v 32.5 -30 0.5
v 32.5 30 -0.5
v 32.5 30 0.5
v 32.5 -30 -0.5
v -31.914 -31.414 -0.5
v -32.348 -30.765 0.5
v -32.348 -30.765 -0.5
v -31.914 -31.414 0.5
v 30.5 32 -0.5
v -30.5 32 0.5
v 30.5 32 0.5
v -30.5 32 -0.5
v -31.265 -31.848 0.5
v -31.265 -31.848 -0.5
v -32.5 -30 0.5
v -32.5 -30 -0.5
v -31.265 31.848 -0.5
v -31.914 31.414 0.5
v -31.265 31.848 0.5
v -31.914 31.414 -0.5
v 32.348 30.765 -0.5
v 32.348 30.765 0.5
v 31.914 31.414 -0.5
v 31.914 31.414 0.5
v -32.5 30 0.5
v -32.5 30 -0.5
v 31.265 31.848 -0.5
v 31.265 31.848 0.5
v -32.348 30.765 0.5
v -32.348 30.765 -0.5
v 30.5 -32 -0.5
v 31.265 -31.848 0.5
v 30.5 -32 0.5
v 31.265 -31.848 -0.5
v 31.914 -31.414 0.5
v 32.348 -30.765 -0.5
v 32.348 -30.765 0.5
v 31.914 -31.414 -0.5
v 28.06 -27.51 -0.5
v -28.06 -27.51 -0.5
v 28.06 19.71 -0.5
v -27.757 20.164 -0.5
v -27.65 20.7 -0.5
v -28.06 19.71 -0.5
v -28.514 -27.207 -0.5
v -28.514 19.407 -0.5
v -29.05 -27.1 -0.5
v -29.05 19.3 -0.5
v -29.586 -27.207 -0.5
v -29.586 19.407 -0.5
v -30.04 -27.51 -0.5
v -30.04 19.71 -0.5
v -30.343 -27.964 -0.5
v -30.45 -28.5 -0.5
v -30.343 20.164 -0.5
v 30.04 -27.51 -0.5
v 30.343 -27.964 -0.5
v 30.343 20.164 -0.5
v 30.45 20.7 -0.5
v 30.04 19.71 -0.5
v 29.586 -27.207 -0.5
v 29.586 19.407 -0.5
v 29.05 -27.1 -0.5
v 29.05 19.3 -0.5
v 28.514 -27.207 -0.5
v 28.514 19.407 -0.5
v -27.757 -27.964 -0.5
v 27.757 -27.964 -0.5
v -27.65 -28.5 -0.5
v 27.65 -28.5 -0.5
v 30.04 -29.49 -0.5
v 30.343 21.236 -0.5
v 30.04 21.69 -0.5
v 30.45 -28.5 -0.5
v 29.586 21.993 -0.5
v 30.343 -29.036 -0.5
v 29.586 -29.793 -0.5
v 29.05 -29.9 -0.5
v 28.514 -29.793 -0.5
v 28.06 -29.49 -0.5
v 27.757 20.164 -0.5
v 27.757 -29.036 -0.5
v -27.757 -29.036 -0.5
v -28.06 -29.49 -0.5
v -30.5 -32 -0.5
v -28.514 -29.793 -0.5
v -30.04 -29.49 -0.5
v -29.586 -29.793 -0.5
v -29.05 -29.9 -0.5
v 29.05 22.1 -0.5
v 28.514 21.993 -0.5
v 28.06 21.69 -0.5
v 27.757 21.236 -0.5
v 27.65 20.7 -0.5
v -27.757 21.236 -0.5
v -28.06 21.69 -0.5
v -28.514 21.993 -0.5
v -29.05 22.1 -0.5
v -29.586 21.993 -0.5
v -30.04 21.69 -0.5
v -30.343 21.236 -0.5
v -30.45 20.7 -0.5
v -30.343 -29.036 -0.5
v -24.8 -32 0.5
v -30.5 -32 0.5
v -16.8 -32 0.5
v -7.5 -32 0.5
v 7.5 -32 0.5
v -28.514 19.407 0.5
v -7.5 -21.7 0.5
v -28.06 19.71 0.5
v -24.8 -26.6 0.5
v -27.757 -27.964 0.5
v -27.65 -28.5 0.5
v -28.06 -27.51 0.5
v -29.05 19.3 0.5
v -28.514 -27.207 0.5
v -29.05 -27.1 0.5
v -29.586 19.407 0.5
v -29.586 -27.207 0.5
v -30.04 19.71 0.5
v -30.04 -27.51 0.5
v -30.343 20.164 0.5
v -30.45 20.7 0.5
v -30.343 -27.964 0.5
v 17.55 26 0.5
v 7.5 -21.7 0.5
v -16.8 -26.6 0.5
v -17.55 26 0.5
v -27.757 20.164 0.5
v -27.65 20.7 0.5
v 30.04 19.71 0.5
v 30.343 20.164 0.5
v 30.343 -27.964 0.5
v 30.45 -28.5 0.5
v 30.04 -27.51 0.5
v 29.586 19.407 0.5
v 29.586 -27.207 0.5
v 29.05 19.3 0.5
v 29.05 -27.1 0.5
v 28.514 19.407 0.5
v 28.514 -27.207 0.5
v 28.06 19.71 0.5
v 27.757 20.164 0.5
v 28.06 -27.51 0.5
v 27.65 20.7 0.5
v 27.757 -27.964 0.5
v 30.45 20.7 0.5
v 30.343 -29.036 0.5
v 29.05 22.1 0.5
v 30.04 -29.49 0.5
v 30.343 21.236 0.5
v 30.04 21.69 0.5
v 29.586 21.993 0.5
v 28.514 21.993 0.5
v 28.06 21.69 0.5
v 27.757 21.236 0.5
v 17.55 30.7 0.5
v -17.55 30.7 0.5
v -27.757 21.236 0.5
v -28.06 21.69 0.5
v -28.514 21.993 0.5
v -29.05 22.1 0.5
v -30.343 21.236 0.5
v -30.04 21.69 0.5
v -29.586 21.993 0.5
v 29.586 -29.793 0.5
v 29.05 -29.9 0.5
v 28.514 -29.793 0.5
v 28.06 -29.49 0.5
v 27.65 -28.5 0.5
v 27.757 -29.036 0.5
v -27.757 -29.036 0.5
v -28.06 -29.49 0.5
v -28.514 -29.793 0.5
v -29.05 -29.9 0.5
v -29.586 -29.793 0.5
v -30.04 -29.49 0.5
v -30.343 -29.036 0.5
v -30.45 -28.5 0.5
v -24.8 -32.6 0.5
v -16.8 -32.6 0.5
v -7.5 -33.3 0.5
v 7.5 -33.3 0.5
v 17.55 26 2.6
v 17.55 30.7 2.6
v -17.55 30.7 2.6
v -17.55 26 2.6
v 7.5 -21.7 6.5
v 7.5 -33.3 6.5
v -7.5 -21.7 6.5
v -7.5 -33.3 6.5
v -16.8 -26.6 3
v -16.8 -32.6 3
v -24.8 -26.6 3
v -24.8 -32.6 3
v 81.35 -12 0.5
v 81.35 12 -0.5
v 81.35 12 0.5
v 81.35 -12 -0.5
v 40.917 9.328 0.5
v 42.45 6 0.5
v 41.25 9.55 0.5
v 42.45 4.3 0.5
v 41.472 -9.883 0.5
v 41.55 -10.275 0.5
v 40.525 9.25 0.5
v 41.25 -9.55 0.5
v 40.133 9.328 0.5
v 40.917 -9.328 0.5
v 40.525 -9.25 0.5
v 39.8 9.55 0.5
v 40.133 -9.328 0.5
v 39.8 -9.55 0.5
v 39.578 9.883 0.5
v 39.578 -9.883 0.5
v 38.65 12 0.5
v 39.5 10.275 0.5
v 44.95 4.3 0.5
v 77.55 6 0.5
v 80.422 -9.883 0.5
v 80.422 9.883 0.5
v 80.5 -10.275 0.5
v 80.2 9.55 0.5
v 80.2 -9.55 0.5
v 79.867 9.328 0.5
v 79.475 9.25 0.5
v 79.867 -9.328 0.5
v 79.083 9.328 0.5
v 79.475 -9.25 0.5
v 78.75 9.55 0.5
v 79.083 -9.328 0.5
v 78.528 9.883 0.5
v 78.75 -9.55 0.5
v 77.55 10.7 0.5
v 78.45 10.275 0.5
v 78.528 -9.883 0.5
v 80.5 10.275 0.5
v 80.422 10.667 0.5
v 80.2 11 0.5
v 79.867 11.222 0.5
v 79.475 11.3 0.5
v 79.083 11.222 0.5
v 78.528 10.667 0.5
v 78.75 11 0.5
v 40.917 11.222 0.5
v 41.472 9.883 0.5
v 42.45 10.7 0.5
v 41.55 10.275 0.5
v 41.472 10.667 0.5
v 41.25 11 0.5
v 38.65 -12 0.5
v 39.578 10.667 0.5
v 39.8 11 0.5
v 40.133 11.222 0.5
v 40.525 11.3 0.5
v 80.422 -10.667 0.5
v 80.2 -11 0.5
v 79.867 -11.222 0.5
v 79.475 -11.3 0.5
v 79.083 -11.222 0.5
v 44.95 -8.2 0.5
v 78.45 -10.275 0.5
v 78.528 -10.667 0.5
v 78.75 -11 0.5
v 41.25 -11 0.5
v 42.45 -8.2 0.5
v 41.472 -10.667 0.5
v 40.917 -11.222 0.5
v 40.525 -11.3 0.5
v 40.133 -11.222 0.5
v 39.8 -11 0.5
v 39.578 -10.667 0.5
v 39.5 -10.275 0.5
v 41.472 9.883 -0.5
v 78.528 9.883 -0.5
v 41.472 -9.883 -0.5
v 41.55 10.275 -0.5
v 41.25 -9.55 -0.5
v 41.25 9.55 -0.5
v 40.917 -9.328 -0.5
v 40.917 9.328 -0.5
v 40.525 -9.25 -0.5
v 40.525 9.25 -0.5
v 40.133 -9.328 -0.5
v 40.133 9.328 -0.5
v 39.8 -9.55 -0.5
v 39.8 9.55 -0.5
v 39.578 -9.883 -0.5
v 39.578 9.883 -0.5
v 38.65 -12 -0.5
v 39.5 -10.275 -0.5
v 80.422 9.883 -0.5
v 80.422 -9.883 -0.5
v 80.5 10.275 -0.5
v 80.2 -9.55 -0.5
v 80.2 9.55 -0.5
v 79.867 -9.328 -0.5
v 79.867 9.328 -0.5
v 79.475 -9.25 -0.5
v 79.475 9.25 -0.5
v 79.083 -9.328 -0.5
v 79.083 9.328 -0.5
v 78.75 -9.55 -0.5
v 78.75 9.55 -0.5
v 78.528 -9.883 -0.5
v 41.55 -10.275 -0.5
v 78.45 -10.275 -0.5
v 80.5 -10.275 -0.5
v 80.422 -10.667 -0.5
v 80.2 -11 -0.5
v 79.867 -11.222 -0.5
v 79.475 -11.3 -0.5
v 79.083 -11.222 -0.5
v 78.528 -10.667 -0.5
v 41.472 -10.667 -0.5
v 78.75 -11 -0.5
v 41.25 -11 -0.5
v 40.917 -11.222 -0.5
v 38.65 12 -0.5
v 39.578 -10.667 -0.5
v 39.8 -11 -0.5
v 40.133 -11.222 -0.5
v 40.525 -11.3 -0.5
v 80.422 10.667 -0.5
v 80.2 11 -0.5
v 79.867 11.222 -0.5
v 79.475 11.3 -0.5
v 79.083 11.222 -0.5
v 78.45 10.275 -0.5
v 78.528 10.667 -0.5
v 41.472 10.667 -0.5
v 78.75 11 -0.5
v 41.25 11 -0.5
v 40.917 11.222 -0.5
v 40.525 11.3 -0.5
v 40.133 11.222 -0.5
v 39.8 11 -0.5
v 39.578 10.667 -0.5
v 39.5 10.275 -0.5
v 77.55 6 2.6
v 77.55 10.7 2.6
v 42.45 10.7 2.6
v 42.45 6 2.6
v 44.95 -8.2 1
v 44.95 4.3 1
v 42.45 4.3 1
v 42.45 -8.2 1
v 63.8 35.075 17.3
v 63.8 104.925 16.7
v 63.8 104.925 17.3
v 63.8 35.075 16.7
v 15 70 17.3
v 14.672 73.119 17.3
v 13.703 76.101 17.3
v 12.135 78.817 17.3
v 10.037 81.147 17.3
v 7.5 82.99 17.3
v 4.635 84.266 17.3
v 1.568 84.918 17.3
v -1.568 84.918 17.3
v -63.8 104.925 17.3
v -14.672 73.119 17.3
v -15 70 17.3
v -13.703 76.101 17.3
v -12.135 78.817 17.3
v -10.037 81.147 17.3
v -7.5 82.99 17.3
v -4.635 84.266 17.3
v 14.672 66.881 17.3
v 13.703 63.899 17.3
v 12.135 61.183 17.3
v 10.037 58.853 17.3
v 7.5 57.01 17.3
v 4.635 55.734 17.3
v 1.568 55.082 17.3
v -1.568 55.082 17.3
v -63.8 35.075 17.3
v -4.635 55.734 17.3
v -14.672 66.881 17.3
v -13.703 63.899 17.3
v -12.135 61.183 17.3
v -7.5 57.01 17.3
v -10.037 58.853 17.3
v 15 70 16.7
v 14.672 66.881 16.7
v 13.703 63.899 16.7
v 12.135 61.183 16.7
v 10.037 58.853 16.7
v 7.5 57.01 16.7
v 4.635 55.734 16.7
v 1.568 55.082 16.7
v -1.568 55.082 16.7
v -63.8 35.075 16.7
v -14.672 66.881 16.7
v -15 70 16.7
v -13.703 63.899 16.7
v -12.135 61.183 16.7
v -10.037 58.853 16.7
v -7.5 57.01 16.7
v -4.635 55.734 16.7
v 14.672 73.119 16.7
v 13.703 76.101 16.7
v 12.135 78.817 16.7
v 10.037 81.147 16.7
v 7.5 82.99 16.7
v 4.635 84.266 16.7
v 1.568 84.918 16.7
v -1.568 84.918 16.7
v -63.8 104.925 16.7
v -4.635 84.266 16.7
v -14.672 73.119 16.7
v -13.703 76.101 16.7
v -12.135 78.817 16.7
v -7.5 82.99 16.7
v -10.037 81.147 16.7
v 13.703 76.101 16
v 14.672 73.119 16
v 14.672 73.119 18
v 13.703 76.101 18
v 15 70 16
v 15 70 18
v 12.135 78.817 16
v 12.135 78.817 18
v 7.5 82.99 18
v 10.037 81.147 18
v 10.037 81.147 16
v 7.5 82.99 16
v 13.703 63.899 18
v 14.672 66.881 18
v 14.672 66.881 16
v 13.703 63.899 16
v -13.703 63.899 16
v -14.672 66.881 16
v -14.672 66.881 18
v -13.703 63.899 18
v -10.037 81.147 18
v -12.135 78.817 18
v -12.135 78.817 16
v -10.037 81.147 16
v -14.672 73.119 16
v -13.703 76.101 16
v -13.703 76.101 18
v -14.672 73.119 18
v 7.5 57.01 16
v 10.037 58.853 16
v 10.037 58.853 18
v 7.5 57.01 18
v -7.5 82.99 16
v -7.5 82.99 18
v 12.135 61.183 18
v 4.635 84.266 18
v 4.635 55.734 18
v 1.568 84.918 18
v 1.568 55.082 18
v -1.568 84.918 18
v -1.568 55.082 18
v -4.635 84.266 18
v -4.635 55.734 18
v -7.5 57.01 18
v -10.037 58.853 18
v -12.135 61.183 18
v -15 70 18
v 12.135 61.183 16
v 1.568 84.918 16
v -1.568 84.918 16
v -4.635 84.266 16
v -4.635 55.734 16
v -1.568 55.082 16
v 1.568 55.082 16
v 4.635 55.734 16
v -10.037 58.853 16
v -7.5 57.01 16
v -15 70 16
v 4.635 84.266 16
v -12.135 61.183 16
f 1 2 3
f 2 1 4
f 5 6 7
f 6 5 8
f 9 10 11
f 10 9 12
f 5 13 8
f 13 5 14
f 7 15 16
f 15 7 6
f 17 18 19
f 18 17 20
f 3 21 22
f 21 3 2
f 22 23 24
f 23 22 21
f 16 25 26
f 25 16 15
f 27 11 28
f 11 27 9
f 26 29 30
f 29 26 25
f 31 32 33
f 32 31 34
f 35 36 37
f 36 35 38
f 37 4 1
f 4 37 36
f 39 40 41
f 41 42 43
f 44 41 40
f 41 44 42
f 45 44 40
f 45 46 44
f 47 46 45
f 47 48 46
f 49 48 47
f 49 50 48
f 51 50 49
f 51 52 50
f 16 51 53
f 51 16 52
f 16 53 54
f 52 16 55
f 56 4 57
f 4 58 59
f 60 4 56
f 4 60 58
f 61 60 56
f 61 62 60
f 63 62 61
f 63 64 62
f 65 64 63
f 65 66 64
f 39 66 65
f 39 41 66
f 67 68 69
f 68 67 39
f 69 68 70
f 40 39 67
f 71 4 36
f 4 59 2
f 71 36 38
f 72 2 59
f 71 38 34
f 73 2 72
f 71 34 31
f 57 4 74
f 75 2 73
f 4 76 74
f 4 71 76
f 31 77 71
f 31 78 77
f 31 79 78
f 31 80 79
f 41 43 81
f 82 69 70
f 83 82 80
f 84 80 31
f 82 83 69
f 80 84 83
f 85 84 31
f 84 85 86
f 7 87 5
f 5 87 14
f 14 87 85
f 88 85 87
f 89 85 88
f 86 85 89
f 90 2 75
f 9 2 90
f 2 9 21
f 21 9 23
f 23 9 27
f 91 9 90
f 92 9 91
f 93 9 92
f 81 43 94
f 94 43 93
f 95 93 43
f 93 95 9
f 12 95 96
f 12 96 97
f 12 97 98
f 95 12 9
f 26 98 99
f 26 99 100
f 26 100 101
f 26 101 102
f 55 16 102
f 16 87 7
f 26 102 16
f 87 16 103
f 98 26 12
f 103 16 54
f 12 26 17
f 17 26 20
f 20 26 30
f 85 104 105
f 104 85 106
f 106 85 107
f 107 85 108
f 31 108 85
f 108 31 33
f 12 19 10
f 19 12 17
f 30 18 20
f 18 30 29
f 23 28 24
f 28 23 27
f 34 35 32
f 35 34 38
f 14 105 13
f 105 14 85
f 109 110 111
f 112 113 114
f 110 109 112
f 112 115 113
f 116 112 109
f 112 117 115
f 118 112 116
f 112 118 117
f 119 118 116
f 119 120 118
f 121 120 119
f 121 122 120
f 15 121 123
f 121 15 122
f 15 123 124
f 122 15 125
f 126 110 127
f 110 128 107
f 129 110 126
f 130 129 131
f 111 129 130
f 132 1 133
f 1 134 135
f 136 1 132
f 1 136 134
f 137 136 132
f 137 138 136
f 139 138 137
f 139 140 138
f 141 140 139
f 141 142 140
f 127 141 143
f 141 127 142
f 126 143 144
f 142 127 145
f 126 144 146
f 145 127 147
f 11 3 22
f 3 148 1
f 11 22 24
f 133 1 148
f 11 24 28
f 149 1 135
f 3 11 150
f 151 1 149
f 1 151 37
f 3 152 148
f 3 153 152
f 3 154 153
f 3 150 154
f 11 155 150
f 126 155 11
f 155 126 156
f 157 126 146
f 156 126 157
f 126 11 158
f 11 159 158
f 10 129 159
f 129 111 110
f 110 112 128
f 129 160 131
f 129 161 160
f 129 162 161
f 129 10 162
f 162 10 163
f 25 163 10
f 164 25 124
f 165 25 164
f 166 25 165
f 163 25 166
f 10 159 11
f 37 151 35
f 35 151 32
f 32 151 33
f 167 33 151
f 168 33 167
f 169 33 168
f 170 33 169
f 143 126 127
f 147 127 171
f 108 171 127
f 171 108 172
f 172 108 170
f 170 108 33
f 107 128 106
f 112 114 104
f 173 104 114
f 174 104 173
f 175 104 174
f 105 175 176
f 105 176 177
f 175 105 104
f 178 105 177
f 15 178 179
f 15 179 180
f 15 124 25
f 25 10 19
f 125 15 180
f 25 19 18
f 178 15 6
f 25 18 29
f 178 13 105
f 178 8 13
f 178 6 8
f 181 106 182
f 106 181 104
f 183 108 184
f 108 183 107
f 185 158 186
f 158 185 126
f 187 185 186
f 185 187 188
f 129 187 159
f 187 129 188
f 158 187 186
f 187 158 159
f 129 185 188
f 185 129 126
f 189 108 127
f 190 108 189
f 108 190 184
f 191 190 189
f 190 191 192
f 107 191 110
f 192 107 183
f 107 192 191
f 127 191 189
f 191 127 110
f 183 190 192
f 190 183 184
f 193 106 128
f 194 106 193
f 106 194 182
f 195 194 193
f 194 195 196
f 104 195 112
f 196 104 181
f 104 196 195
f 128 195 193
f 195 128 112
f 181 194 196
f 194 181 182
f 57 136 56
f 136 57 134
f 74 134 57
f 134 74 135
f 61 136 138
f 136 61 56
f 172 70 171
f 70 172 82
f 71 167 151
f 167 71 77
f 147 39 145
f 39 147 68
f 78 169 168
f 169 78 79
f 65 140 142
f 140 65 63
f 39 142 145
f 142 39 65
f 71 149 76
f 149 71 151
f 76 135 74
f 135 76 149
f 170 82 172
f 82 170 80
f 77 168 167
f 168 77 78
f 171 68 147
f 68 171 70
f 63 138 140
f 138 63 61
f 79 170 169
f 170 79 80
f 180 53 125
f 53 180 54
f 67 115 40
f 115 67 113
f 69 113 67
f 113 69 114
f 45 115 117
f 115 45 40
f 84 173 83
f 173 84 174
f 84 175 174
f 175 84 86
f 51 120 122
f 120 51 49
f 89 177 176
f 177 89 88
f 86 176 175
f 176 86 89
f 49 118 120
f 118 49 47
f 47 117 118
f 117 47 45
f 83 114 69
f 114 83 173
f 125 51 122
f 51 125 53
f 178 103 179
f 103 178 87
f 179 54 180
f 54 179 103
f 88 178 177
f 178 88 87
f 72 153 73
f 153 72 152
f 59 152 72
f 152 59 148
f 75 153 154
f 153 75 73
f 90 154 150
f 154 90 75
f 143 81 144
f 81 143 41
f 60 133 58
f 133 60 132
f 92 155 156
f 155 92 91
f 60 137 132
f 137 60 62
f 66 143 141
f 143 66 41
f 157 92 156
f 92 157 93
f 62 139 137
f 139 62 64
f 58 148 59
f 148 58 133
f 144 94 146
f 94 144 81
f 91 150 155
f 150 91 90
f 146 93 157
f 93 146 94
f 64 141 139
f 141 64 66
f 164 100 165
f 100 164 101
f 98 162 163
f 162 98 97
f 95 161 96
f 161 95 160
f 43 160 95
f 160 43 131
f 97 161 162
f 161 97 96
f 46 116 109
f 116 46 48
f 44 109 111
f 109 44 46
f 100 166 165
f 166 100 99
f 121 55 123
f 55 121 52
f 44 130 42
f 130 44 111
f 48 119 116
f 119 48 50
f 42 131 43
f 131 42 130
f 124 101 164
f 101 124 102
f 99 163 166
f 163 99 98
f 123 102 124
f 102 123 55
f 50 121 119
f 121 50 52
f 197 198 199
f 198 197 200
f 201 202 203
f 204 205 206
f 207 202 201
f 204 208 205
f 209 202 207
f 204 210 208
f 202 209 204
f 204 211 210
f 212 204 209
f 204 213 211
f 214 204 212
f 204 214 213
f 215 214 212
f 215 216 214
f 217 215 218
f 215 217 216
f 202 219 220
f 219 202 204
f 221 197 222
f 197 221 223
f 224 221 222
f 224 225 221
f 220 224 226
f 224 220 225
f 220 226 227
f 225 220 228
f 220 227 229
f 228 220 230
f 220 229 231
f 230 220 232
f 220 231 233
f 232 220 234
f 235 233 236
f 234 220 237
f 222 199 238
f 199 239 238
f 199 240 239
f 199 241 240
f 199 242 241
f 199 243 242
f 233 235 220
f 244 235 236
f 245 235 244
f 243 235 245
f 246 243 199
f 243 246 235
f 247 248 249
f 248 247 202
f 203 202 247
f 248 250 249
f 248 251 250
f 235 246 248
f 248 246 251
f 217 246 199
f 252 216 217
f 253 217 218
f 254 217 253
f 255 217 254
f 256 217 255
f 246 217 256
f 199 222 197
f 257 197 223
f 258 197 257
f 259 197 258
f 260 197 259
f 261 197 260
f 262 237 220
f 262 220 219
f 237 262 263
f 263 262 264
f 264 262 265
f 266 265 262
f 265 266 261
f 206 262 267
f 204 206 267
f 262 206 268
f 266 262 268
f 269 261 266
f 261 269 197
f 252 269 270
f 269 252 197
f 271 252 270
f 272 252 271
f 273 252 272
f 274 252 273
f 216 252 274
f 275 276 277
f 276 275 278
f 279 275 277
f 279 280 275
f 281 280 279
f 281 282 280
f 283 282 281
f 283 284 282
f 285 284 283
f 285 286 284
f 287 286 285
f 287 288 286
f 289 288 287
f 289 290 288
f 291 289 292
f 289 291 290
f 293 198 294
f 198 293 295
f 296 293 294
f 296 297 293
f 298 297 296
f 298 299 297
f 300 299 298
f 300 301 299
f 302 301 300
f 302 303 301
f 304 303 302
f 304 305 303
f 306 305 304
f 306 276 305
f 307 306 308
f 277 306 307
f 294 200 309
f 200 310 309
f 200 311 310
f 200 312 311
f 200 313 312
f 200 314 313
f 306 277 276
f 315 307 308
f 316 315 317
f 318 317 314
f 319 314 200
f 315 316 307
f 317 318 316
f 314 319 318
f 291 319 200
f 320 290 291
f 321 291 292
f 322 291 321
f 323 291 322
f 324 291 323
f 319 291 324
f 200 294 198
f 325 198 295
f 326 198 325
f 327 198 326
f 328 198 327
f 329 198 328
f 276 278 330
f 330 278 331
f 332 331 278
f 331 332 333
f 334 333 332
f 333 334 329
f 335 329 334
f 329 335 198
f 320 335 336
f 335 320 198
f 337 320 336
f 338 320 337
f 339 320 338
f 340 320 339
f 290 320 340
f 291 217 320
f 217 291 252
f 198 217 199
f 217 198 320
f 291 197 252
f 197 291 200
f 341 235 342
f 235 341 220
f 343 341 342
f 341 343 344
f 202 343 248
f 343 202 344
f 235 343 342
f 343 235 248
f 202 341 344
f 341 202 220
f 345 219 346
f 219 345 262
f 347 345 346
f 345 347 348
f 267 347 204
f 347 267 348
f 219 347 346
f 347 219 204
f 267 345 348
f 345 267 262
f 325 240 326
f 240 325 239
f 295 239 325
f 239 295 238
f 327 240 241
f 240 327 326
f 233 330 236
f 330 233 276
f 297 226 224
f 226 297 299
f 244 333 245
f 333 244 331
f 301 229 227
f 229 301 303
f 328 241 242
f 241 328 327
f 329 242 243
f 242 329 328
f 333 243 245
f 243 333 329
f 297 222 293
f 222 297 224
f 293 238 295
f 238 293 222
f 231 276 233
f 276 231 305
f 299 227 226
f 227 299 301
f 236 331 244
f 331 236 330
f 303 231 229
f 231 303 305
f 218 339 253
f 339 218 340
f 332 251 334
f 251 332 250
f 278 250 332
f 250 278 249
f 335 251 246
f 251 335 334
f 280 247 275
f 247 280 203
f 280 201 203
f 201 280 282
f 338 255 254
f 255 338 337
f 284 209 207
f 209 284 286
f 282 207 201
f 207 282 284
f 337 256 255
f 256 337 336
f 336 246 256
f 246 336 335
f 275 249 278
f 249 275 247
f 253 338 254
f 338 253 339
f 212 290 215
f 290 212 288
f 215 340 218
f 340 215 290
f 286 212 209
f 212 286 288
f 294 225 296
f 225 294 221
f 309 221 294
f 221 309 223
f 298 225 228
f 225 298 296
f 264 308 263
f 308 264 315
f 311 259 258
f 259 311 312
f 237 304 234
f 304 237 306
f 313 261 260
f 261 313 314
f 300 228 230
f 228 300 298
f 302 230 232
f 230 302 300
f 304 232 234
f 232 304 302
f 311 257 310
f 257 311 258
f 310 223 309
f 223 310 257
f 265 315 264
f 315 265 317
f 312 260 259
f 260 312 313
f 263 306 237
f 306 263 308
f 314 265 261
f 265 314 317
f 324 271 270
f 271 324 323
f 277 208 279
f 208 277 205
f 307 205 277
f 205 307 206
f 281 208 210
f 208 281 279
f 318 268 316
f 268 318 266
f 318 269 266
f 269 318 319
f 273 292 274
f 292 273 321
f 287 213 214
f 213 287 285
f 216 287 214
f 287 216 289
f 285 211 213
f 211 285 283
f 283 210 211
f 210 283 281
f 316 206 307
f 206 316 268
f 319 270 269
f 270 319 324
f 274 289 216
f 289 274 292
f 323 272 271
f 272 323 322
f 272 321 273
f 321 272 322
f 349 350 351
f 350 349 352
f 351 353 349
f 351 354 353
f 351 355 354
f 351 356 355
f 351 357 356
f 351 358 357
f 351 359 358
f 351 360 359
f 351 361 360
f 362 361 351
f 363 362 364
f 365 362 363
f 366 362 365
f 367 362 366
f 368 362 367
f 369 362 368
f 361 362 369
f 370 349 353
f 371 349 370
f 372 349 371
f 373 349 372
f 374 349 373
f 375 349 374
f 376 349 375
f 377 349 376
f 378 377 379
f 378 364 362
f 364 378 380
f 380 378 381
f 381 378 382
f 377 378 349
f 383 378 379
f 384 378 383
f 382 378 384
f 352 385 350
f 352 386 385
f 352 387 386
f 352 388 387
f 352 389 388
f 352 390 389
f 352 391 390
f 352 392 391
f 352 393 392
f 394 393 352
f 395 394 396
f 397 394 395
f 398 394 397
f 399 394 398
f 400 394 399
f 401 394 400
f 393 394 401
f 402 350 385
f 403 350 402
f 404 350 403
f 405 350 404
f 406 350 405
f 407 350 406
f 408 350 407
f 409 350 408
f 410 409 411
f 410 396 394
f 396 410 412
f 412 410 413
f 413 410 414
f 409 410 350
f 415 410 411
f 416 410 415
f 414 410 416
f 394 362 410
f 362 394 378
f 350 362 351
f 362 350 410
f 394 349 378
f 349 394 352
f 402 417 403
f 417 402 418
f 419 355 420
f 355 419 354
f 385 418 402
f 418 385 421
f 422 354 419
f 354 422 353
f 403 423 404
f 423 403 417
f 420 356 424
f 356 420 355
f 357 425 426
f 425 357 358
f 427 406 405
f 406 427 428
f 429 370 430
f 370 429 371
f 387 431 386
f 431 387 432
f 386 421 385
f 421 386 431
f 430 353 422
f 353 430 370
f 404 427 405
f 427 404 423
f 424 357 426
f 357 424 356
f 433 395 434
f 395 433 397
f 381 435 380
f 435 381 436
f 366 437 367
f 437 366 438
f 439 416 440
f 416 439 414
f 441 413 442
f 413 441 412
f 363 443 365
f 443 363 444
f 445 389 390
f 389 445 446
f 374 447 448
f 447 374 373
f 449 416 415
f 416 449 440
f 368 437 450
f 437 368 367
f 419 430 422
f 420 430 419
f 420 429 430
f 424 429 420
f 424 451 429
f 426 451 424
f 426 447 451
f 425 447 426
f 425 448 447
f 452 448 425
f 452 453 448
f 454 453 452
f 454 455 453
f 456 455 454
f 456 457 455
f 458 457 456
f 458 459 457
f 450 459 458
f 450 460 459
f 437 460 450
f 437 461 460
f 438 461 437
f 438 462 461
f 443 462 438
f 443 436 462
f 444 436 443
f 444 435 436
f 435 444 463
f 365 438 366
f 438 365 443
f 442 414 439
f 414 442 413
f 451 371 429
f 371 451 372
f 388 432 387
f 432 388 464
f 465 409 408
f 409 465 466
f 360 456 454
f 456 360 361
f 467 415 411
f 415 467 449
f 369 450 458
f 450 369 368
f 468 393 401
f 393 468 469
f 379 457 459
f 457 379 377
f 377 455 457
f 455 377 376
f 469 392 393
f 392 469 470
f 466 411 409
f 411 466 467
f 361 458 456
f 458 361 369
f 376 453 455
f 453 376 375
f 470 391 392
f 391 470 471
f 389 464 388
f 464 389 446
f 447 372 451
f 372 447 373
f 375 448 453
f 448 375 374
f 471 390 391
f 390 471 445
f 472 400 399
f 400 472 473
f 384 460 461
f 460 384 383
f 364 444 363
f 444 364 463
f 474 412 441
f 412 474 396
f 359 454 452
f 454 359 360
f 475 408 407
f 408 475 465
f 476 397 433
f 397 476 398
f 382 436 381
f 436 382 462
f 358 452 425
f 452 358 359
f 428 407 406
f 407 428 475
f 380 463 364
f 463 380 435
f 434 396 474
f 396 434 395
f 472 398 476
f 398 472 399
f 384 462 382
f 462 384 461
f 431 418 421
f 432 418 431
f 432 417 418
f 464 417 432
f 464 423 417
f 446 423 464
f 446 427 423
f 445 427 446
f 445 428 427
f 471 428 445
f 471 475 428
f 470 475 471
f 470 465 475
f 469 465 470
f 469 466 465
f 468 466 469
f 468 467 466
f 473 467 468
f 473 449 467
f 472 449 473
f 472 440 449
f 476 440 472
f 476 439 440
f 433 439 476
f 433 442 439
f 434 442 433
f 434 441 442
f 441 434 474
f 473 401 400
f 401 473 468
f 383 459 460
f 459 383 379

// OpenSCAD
pcb_thickness = 1.0;

hole_dia_small = 2.05;
hole_dia_large = 2.8;

corner_radius = 4.0;

pcb_large();

translate([60,0,0]) pcb_small();

translate([0,70,34/2]){
    lcd();
    cylinder(d=30, h=2, center=true);
}

module pcb_small(){
    difference(){
        union(){
            color("SteelBlue") cube([42.7, 24.0, pcb_thickness], center=true);
            translate([0,24/2-4.7/2-1.3,pcb_thickness/2]) flex_connector();
            color("DimGray") translate([2.5/2-42.7/2+3.8,12.5/2-24/2+3.8,0.5]) cube([2.5, 12.5, 1.0], center=true);
        }
        translate([(41-hole_dia_small)/2, (22.6-hole_dia_small)/2, 0]) 
            cylinder(d=hole_dia_small, h=pcb_thickness*3, center=true, $fn=16);
        translate([-(41-hole_dia_small)/2, (22.6-hole_dia_small)/2, 0]) 
            cylinder(d=hole_dia_small, h=pcb_thickness*3, center=true, $fn=16);
        translate([(41-hole_dia_small)/2, -(22.6-hole_dia_small)/2, 0]) 
            cylinder(d=hole_dia_small, h=pcb_thickness*3, center=true, $fn=16);
        translate([-(41-hole_dia_small)/2, -(22.6-hole_dia_small)/2, 0]) 
            cylinder(d=hole_dia_small, h=pcb_thickness*3, center=true, $fn=16);
    }
}

module pcb_large(){
    difference(){
        union(){
            color("SteelBlue") hull(){
                translate([(65-corner_radius)/2, (64-corner_radius)/2, 0]) 
                    cylinder(d = corner_radius, h = pcb_thickness, $fn=16, center=true);
                translate([-(65-corner_radius)/2, (64-corner_radius)/2, 0]) 
                    cylinder(d = corner_radius, h = pcb_thickness, $fn=16, center=true);
                translate([(65-corner_radius)/2, -(64-corner_radius)/2, 0]) 
                    cylinder(d = corner_radius, h = pcb_thickness, $fn=16, center=true);
                translate([-(65-corner_radius)/2, -(64-corner_radius)/2, 0]) 
                    cylinder(d = corner_radius, h = pcb_thickness, $fn=16, center=true);
            }
            translate([0,(64-4.7)/2-1.3,pcb_thickness/2]) flex_connector();
            // HDMI:
            translate([0, -(64-11.6)/2-1.3,(6+pcb_thickness)/2]) color("Silver") 
                cube([15,11.6, 6], center=true);
            // USB:
            translate([7.7-(65-8)/2, -(64-6)/2-0.6,(2.5+pcb_thickness)/2]) color("Silver") 
                cube([8, 6, 2.5], center=true);
            
        }
        translate([(55.3+hole_dia_large)/2, 2.1-(64-hole_dia_large)/2, 0])
            #cylinder(d=hole_dia_large, h=pcb_thickness*3, $fn=16, center=true);
        translate([-(55.3+hole_dia_large)/2, 2.1-(64-hole_dia_large)/2, 0])
            cylinder(d=hole_dia_large, h=pcb_thickness*3, $fn=16, center=true);
        
        translate([(55.3+hole_dia_large)/2, hole_dia_large+46.4+2.1-(64-hole_dia_large)/2, 0])
            #cylinder(d=hole_dia_large, h=pcb_thickness*3, $fn=16, center=true);
        translate([-(55.3+hole_dia_large)/2, hole_dia_large+46.4+2.1-(64-hole_dia_large)/2, 0])
            cylinder(d=hole_dia_large, h=pcb_thickness*3, $fn=16, center=true);
    }
}

module flex_connector(){
    color("White") translate([0,0,2.1/2]) cube([35.1, 4.7, 2.1], center=true);
}

module lcd(){
    color("Silver") cube([127.6, 69.85, 0.6], center=true);
}
